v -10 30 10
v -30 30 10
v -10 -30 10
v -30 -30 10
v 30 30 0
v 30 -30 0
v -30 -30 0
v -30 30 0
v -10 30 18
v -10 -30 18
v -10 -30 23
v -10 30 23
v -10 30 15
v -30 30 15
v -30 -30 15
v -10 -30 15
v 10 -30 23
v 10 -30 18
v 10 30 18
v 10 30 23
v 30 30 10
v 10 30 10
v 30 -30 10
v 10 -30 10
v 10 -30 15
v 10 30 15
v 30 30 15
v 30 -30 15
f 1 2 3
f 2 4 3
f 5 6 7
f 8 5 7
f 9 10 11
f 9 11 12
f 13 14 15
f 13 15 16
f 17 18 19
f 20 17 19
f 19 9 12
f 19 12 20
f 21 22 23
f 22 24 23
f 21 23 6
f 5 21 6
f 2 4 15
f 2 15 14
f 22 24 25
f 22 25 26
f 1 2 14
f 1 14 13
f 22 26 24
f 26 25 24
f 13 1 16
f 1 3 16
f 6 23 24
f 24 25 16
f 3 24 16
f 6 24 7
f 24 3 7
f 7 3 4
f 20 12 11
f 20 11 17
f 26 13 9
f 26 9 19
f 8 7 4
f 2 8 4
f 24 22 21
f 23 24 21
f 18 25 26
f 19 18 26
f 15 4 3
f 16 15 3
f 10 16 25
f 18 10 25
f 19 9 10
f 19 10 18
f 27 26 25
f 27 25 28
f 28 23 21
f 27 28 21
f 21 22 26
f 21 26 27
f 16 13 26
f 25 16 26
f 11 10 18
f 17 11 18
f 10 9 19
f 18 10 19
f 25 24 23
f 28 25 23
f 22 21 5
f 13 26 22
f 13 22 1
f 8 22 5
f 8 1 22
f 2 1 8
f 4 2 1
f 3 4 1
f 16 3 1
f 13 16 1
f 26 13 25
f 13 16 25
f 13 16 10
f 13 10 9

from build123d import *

# Parameters (mm, degrees)
PAD_DEPTH    = 30
SKETCH001_W  = 20
SKETCH001_H  = 60
PAD001_DEPTH = 5
SKETCH002_W  = 20
SKETCH002_H  = 60
PAD002_DEPTH = 3
SKETCH003_W  = 20
SKETCH003_H  = 60
PAD003_DEPTH = 5


with BuildPart() as p_type_si:
    # Sketch → Pad (new body, symmetric)
    with BuildSketch(Plane.XZ):
        Polygon((-30, 0), (-30, 10), (-10, 10), (-10, 15), (10, 15), (10, 10), (30, 10), (30, 0), align=None)
    extrude(amount=PAD_DEPTH, both=True)


with BuildPart() as n_type_si:
    # Sketch001 → Pad001 (new body)
    with BuildSketch(Plane.XY.offset(10)):
        with Locations((-20, 0)):
            Rectangle(SKETCH001_W, SKETCH001_H)
        with Locations((20, 0)):
            Rectangle(SKETCH001_W, SKETCH001_H)
    extrude(amount=PAD001_DEPTH)


with BuildPart() as oxide_film:
    # Sketch002 → Pad002 (new body)
    with BuildSketch(Plane.XY.offset(15)):
        Rectangle(SKETCH002_W, SKETCH002_H)
    extrude(amount=PAD002_DEPTH)


with BuildPart() as metal_gate:
    # Sketch003 → Pad003 (new body)
    with BuildSketch(Plane.XY.offset(18)):
        Rectangle(SKETCH003_W, SKETCH003_H)
    extrude(amount=PAD003_DEPTH)


solid = Compound([p_type_si.part, n_type_si.part, oxide_film.part, metal_gate.part])
